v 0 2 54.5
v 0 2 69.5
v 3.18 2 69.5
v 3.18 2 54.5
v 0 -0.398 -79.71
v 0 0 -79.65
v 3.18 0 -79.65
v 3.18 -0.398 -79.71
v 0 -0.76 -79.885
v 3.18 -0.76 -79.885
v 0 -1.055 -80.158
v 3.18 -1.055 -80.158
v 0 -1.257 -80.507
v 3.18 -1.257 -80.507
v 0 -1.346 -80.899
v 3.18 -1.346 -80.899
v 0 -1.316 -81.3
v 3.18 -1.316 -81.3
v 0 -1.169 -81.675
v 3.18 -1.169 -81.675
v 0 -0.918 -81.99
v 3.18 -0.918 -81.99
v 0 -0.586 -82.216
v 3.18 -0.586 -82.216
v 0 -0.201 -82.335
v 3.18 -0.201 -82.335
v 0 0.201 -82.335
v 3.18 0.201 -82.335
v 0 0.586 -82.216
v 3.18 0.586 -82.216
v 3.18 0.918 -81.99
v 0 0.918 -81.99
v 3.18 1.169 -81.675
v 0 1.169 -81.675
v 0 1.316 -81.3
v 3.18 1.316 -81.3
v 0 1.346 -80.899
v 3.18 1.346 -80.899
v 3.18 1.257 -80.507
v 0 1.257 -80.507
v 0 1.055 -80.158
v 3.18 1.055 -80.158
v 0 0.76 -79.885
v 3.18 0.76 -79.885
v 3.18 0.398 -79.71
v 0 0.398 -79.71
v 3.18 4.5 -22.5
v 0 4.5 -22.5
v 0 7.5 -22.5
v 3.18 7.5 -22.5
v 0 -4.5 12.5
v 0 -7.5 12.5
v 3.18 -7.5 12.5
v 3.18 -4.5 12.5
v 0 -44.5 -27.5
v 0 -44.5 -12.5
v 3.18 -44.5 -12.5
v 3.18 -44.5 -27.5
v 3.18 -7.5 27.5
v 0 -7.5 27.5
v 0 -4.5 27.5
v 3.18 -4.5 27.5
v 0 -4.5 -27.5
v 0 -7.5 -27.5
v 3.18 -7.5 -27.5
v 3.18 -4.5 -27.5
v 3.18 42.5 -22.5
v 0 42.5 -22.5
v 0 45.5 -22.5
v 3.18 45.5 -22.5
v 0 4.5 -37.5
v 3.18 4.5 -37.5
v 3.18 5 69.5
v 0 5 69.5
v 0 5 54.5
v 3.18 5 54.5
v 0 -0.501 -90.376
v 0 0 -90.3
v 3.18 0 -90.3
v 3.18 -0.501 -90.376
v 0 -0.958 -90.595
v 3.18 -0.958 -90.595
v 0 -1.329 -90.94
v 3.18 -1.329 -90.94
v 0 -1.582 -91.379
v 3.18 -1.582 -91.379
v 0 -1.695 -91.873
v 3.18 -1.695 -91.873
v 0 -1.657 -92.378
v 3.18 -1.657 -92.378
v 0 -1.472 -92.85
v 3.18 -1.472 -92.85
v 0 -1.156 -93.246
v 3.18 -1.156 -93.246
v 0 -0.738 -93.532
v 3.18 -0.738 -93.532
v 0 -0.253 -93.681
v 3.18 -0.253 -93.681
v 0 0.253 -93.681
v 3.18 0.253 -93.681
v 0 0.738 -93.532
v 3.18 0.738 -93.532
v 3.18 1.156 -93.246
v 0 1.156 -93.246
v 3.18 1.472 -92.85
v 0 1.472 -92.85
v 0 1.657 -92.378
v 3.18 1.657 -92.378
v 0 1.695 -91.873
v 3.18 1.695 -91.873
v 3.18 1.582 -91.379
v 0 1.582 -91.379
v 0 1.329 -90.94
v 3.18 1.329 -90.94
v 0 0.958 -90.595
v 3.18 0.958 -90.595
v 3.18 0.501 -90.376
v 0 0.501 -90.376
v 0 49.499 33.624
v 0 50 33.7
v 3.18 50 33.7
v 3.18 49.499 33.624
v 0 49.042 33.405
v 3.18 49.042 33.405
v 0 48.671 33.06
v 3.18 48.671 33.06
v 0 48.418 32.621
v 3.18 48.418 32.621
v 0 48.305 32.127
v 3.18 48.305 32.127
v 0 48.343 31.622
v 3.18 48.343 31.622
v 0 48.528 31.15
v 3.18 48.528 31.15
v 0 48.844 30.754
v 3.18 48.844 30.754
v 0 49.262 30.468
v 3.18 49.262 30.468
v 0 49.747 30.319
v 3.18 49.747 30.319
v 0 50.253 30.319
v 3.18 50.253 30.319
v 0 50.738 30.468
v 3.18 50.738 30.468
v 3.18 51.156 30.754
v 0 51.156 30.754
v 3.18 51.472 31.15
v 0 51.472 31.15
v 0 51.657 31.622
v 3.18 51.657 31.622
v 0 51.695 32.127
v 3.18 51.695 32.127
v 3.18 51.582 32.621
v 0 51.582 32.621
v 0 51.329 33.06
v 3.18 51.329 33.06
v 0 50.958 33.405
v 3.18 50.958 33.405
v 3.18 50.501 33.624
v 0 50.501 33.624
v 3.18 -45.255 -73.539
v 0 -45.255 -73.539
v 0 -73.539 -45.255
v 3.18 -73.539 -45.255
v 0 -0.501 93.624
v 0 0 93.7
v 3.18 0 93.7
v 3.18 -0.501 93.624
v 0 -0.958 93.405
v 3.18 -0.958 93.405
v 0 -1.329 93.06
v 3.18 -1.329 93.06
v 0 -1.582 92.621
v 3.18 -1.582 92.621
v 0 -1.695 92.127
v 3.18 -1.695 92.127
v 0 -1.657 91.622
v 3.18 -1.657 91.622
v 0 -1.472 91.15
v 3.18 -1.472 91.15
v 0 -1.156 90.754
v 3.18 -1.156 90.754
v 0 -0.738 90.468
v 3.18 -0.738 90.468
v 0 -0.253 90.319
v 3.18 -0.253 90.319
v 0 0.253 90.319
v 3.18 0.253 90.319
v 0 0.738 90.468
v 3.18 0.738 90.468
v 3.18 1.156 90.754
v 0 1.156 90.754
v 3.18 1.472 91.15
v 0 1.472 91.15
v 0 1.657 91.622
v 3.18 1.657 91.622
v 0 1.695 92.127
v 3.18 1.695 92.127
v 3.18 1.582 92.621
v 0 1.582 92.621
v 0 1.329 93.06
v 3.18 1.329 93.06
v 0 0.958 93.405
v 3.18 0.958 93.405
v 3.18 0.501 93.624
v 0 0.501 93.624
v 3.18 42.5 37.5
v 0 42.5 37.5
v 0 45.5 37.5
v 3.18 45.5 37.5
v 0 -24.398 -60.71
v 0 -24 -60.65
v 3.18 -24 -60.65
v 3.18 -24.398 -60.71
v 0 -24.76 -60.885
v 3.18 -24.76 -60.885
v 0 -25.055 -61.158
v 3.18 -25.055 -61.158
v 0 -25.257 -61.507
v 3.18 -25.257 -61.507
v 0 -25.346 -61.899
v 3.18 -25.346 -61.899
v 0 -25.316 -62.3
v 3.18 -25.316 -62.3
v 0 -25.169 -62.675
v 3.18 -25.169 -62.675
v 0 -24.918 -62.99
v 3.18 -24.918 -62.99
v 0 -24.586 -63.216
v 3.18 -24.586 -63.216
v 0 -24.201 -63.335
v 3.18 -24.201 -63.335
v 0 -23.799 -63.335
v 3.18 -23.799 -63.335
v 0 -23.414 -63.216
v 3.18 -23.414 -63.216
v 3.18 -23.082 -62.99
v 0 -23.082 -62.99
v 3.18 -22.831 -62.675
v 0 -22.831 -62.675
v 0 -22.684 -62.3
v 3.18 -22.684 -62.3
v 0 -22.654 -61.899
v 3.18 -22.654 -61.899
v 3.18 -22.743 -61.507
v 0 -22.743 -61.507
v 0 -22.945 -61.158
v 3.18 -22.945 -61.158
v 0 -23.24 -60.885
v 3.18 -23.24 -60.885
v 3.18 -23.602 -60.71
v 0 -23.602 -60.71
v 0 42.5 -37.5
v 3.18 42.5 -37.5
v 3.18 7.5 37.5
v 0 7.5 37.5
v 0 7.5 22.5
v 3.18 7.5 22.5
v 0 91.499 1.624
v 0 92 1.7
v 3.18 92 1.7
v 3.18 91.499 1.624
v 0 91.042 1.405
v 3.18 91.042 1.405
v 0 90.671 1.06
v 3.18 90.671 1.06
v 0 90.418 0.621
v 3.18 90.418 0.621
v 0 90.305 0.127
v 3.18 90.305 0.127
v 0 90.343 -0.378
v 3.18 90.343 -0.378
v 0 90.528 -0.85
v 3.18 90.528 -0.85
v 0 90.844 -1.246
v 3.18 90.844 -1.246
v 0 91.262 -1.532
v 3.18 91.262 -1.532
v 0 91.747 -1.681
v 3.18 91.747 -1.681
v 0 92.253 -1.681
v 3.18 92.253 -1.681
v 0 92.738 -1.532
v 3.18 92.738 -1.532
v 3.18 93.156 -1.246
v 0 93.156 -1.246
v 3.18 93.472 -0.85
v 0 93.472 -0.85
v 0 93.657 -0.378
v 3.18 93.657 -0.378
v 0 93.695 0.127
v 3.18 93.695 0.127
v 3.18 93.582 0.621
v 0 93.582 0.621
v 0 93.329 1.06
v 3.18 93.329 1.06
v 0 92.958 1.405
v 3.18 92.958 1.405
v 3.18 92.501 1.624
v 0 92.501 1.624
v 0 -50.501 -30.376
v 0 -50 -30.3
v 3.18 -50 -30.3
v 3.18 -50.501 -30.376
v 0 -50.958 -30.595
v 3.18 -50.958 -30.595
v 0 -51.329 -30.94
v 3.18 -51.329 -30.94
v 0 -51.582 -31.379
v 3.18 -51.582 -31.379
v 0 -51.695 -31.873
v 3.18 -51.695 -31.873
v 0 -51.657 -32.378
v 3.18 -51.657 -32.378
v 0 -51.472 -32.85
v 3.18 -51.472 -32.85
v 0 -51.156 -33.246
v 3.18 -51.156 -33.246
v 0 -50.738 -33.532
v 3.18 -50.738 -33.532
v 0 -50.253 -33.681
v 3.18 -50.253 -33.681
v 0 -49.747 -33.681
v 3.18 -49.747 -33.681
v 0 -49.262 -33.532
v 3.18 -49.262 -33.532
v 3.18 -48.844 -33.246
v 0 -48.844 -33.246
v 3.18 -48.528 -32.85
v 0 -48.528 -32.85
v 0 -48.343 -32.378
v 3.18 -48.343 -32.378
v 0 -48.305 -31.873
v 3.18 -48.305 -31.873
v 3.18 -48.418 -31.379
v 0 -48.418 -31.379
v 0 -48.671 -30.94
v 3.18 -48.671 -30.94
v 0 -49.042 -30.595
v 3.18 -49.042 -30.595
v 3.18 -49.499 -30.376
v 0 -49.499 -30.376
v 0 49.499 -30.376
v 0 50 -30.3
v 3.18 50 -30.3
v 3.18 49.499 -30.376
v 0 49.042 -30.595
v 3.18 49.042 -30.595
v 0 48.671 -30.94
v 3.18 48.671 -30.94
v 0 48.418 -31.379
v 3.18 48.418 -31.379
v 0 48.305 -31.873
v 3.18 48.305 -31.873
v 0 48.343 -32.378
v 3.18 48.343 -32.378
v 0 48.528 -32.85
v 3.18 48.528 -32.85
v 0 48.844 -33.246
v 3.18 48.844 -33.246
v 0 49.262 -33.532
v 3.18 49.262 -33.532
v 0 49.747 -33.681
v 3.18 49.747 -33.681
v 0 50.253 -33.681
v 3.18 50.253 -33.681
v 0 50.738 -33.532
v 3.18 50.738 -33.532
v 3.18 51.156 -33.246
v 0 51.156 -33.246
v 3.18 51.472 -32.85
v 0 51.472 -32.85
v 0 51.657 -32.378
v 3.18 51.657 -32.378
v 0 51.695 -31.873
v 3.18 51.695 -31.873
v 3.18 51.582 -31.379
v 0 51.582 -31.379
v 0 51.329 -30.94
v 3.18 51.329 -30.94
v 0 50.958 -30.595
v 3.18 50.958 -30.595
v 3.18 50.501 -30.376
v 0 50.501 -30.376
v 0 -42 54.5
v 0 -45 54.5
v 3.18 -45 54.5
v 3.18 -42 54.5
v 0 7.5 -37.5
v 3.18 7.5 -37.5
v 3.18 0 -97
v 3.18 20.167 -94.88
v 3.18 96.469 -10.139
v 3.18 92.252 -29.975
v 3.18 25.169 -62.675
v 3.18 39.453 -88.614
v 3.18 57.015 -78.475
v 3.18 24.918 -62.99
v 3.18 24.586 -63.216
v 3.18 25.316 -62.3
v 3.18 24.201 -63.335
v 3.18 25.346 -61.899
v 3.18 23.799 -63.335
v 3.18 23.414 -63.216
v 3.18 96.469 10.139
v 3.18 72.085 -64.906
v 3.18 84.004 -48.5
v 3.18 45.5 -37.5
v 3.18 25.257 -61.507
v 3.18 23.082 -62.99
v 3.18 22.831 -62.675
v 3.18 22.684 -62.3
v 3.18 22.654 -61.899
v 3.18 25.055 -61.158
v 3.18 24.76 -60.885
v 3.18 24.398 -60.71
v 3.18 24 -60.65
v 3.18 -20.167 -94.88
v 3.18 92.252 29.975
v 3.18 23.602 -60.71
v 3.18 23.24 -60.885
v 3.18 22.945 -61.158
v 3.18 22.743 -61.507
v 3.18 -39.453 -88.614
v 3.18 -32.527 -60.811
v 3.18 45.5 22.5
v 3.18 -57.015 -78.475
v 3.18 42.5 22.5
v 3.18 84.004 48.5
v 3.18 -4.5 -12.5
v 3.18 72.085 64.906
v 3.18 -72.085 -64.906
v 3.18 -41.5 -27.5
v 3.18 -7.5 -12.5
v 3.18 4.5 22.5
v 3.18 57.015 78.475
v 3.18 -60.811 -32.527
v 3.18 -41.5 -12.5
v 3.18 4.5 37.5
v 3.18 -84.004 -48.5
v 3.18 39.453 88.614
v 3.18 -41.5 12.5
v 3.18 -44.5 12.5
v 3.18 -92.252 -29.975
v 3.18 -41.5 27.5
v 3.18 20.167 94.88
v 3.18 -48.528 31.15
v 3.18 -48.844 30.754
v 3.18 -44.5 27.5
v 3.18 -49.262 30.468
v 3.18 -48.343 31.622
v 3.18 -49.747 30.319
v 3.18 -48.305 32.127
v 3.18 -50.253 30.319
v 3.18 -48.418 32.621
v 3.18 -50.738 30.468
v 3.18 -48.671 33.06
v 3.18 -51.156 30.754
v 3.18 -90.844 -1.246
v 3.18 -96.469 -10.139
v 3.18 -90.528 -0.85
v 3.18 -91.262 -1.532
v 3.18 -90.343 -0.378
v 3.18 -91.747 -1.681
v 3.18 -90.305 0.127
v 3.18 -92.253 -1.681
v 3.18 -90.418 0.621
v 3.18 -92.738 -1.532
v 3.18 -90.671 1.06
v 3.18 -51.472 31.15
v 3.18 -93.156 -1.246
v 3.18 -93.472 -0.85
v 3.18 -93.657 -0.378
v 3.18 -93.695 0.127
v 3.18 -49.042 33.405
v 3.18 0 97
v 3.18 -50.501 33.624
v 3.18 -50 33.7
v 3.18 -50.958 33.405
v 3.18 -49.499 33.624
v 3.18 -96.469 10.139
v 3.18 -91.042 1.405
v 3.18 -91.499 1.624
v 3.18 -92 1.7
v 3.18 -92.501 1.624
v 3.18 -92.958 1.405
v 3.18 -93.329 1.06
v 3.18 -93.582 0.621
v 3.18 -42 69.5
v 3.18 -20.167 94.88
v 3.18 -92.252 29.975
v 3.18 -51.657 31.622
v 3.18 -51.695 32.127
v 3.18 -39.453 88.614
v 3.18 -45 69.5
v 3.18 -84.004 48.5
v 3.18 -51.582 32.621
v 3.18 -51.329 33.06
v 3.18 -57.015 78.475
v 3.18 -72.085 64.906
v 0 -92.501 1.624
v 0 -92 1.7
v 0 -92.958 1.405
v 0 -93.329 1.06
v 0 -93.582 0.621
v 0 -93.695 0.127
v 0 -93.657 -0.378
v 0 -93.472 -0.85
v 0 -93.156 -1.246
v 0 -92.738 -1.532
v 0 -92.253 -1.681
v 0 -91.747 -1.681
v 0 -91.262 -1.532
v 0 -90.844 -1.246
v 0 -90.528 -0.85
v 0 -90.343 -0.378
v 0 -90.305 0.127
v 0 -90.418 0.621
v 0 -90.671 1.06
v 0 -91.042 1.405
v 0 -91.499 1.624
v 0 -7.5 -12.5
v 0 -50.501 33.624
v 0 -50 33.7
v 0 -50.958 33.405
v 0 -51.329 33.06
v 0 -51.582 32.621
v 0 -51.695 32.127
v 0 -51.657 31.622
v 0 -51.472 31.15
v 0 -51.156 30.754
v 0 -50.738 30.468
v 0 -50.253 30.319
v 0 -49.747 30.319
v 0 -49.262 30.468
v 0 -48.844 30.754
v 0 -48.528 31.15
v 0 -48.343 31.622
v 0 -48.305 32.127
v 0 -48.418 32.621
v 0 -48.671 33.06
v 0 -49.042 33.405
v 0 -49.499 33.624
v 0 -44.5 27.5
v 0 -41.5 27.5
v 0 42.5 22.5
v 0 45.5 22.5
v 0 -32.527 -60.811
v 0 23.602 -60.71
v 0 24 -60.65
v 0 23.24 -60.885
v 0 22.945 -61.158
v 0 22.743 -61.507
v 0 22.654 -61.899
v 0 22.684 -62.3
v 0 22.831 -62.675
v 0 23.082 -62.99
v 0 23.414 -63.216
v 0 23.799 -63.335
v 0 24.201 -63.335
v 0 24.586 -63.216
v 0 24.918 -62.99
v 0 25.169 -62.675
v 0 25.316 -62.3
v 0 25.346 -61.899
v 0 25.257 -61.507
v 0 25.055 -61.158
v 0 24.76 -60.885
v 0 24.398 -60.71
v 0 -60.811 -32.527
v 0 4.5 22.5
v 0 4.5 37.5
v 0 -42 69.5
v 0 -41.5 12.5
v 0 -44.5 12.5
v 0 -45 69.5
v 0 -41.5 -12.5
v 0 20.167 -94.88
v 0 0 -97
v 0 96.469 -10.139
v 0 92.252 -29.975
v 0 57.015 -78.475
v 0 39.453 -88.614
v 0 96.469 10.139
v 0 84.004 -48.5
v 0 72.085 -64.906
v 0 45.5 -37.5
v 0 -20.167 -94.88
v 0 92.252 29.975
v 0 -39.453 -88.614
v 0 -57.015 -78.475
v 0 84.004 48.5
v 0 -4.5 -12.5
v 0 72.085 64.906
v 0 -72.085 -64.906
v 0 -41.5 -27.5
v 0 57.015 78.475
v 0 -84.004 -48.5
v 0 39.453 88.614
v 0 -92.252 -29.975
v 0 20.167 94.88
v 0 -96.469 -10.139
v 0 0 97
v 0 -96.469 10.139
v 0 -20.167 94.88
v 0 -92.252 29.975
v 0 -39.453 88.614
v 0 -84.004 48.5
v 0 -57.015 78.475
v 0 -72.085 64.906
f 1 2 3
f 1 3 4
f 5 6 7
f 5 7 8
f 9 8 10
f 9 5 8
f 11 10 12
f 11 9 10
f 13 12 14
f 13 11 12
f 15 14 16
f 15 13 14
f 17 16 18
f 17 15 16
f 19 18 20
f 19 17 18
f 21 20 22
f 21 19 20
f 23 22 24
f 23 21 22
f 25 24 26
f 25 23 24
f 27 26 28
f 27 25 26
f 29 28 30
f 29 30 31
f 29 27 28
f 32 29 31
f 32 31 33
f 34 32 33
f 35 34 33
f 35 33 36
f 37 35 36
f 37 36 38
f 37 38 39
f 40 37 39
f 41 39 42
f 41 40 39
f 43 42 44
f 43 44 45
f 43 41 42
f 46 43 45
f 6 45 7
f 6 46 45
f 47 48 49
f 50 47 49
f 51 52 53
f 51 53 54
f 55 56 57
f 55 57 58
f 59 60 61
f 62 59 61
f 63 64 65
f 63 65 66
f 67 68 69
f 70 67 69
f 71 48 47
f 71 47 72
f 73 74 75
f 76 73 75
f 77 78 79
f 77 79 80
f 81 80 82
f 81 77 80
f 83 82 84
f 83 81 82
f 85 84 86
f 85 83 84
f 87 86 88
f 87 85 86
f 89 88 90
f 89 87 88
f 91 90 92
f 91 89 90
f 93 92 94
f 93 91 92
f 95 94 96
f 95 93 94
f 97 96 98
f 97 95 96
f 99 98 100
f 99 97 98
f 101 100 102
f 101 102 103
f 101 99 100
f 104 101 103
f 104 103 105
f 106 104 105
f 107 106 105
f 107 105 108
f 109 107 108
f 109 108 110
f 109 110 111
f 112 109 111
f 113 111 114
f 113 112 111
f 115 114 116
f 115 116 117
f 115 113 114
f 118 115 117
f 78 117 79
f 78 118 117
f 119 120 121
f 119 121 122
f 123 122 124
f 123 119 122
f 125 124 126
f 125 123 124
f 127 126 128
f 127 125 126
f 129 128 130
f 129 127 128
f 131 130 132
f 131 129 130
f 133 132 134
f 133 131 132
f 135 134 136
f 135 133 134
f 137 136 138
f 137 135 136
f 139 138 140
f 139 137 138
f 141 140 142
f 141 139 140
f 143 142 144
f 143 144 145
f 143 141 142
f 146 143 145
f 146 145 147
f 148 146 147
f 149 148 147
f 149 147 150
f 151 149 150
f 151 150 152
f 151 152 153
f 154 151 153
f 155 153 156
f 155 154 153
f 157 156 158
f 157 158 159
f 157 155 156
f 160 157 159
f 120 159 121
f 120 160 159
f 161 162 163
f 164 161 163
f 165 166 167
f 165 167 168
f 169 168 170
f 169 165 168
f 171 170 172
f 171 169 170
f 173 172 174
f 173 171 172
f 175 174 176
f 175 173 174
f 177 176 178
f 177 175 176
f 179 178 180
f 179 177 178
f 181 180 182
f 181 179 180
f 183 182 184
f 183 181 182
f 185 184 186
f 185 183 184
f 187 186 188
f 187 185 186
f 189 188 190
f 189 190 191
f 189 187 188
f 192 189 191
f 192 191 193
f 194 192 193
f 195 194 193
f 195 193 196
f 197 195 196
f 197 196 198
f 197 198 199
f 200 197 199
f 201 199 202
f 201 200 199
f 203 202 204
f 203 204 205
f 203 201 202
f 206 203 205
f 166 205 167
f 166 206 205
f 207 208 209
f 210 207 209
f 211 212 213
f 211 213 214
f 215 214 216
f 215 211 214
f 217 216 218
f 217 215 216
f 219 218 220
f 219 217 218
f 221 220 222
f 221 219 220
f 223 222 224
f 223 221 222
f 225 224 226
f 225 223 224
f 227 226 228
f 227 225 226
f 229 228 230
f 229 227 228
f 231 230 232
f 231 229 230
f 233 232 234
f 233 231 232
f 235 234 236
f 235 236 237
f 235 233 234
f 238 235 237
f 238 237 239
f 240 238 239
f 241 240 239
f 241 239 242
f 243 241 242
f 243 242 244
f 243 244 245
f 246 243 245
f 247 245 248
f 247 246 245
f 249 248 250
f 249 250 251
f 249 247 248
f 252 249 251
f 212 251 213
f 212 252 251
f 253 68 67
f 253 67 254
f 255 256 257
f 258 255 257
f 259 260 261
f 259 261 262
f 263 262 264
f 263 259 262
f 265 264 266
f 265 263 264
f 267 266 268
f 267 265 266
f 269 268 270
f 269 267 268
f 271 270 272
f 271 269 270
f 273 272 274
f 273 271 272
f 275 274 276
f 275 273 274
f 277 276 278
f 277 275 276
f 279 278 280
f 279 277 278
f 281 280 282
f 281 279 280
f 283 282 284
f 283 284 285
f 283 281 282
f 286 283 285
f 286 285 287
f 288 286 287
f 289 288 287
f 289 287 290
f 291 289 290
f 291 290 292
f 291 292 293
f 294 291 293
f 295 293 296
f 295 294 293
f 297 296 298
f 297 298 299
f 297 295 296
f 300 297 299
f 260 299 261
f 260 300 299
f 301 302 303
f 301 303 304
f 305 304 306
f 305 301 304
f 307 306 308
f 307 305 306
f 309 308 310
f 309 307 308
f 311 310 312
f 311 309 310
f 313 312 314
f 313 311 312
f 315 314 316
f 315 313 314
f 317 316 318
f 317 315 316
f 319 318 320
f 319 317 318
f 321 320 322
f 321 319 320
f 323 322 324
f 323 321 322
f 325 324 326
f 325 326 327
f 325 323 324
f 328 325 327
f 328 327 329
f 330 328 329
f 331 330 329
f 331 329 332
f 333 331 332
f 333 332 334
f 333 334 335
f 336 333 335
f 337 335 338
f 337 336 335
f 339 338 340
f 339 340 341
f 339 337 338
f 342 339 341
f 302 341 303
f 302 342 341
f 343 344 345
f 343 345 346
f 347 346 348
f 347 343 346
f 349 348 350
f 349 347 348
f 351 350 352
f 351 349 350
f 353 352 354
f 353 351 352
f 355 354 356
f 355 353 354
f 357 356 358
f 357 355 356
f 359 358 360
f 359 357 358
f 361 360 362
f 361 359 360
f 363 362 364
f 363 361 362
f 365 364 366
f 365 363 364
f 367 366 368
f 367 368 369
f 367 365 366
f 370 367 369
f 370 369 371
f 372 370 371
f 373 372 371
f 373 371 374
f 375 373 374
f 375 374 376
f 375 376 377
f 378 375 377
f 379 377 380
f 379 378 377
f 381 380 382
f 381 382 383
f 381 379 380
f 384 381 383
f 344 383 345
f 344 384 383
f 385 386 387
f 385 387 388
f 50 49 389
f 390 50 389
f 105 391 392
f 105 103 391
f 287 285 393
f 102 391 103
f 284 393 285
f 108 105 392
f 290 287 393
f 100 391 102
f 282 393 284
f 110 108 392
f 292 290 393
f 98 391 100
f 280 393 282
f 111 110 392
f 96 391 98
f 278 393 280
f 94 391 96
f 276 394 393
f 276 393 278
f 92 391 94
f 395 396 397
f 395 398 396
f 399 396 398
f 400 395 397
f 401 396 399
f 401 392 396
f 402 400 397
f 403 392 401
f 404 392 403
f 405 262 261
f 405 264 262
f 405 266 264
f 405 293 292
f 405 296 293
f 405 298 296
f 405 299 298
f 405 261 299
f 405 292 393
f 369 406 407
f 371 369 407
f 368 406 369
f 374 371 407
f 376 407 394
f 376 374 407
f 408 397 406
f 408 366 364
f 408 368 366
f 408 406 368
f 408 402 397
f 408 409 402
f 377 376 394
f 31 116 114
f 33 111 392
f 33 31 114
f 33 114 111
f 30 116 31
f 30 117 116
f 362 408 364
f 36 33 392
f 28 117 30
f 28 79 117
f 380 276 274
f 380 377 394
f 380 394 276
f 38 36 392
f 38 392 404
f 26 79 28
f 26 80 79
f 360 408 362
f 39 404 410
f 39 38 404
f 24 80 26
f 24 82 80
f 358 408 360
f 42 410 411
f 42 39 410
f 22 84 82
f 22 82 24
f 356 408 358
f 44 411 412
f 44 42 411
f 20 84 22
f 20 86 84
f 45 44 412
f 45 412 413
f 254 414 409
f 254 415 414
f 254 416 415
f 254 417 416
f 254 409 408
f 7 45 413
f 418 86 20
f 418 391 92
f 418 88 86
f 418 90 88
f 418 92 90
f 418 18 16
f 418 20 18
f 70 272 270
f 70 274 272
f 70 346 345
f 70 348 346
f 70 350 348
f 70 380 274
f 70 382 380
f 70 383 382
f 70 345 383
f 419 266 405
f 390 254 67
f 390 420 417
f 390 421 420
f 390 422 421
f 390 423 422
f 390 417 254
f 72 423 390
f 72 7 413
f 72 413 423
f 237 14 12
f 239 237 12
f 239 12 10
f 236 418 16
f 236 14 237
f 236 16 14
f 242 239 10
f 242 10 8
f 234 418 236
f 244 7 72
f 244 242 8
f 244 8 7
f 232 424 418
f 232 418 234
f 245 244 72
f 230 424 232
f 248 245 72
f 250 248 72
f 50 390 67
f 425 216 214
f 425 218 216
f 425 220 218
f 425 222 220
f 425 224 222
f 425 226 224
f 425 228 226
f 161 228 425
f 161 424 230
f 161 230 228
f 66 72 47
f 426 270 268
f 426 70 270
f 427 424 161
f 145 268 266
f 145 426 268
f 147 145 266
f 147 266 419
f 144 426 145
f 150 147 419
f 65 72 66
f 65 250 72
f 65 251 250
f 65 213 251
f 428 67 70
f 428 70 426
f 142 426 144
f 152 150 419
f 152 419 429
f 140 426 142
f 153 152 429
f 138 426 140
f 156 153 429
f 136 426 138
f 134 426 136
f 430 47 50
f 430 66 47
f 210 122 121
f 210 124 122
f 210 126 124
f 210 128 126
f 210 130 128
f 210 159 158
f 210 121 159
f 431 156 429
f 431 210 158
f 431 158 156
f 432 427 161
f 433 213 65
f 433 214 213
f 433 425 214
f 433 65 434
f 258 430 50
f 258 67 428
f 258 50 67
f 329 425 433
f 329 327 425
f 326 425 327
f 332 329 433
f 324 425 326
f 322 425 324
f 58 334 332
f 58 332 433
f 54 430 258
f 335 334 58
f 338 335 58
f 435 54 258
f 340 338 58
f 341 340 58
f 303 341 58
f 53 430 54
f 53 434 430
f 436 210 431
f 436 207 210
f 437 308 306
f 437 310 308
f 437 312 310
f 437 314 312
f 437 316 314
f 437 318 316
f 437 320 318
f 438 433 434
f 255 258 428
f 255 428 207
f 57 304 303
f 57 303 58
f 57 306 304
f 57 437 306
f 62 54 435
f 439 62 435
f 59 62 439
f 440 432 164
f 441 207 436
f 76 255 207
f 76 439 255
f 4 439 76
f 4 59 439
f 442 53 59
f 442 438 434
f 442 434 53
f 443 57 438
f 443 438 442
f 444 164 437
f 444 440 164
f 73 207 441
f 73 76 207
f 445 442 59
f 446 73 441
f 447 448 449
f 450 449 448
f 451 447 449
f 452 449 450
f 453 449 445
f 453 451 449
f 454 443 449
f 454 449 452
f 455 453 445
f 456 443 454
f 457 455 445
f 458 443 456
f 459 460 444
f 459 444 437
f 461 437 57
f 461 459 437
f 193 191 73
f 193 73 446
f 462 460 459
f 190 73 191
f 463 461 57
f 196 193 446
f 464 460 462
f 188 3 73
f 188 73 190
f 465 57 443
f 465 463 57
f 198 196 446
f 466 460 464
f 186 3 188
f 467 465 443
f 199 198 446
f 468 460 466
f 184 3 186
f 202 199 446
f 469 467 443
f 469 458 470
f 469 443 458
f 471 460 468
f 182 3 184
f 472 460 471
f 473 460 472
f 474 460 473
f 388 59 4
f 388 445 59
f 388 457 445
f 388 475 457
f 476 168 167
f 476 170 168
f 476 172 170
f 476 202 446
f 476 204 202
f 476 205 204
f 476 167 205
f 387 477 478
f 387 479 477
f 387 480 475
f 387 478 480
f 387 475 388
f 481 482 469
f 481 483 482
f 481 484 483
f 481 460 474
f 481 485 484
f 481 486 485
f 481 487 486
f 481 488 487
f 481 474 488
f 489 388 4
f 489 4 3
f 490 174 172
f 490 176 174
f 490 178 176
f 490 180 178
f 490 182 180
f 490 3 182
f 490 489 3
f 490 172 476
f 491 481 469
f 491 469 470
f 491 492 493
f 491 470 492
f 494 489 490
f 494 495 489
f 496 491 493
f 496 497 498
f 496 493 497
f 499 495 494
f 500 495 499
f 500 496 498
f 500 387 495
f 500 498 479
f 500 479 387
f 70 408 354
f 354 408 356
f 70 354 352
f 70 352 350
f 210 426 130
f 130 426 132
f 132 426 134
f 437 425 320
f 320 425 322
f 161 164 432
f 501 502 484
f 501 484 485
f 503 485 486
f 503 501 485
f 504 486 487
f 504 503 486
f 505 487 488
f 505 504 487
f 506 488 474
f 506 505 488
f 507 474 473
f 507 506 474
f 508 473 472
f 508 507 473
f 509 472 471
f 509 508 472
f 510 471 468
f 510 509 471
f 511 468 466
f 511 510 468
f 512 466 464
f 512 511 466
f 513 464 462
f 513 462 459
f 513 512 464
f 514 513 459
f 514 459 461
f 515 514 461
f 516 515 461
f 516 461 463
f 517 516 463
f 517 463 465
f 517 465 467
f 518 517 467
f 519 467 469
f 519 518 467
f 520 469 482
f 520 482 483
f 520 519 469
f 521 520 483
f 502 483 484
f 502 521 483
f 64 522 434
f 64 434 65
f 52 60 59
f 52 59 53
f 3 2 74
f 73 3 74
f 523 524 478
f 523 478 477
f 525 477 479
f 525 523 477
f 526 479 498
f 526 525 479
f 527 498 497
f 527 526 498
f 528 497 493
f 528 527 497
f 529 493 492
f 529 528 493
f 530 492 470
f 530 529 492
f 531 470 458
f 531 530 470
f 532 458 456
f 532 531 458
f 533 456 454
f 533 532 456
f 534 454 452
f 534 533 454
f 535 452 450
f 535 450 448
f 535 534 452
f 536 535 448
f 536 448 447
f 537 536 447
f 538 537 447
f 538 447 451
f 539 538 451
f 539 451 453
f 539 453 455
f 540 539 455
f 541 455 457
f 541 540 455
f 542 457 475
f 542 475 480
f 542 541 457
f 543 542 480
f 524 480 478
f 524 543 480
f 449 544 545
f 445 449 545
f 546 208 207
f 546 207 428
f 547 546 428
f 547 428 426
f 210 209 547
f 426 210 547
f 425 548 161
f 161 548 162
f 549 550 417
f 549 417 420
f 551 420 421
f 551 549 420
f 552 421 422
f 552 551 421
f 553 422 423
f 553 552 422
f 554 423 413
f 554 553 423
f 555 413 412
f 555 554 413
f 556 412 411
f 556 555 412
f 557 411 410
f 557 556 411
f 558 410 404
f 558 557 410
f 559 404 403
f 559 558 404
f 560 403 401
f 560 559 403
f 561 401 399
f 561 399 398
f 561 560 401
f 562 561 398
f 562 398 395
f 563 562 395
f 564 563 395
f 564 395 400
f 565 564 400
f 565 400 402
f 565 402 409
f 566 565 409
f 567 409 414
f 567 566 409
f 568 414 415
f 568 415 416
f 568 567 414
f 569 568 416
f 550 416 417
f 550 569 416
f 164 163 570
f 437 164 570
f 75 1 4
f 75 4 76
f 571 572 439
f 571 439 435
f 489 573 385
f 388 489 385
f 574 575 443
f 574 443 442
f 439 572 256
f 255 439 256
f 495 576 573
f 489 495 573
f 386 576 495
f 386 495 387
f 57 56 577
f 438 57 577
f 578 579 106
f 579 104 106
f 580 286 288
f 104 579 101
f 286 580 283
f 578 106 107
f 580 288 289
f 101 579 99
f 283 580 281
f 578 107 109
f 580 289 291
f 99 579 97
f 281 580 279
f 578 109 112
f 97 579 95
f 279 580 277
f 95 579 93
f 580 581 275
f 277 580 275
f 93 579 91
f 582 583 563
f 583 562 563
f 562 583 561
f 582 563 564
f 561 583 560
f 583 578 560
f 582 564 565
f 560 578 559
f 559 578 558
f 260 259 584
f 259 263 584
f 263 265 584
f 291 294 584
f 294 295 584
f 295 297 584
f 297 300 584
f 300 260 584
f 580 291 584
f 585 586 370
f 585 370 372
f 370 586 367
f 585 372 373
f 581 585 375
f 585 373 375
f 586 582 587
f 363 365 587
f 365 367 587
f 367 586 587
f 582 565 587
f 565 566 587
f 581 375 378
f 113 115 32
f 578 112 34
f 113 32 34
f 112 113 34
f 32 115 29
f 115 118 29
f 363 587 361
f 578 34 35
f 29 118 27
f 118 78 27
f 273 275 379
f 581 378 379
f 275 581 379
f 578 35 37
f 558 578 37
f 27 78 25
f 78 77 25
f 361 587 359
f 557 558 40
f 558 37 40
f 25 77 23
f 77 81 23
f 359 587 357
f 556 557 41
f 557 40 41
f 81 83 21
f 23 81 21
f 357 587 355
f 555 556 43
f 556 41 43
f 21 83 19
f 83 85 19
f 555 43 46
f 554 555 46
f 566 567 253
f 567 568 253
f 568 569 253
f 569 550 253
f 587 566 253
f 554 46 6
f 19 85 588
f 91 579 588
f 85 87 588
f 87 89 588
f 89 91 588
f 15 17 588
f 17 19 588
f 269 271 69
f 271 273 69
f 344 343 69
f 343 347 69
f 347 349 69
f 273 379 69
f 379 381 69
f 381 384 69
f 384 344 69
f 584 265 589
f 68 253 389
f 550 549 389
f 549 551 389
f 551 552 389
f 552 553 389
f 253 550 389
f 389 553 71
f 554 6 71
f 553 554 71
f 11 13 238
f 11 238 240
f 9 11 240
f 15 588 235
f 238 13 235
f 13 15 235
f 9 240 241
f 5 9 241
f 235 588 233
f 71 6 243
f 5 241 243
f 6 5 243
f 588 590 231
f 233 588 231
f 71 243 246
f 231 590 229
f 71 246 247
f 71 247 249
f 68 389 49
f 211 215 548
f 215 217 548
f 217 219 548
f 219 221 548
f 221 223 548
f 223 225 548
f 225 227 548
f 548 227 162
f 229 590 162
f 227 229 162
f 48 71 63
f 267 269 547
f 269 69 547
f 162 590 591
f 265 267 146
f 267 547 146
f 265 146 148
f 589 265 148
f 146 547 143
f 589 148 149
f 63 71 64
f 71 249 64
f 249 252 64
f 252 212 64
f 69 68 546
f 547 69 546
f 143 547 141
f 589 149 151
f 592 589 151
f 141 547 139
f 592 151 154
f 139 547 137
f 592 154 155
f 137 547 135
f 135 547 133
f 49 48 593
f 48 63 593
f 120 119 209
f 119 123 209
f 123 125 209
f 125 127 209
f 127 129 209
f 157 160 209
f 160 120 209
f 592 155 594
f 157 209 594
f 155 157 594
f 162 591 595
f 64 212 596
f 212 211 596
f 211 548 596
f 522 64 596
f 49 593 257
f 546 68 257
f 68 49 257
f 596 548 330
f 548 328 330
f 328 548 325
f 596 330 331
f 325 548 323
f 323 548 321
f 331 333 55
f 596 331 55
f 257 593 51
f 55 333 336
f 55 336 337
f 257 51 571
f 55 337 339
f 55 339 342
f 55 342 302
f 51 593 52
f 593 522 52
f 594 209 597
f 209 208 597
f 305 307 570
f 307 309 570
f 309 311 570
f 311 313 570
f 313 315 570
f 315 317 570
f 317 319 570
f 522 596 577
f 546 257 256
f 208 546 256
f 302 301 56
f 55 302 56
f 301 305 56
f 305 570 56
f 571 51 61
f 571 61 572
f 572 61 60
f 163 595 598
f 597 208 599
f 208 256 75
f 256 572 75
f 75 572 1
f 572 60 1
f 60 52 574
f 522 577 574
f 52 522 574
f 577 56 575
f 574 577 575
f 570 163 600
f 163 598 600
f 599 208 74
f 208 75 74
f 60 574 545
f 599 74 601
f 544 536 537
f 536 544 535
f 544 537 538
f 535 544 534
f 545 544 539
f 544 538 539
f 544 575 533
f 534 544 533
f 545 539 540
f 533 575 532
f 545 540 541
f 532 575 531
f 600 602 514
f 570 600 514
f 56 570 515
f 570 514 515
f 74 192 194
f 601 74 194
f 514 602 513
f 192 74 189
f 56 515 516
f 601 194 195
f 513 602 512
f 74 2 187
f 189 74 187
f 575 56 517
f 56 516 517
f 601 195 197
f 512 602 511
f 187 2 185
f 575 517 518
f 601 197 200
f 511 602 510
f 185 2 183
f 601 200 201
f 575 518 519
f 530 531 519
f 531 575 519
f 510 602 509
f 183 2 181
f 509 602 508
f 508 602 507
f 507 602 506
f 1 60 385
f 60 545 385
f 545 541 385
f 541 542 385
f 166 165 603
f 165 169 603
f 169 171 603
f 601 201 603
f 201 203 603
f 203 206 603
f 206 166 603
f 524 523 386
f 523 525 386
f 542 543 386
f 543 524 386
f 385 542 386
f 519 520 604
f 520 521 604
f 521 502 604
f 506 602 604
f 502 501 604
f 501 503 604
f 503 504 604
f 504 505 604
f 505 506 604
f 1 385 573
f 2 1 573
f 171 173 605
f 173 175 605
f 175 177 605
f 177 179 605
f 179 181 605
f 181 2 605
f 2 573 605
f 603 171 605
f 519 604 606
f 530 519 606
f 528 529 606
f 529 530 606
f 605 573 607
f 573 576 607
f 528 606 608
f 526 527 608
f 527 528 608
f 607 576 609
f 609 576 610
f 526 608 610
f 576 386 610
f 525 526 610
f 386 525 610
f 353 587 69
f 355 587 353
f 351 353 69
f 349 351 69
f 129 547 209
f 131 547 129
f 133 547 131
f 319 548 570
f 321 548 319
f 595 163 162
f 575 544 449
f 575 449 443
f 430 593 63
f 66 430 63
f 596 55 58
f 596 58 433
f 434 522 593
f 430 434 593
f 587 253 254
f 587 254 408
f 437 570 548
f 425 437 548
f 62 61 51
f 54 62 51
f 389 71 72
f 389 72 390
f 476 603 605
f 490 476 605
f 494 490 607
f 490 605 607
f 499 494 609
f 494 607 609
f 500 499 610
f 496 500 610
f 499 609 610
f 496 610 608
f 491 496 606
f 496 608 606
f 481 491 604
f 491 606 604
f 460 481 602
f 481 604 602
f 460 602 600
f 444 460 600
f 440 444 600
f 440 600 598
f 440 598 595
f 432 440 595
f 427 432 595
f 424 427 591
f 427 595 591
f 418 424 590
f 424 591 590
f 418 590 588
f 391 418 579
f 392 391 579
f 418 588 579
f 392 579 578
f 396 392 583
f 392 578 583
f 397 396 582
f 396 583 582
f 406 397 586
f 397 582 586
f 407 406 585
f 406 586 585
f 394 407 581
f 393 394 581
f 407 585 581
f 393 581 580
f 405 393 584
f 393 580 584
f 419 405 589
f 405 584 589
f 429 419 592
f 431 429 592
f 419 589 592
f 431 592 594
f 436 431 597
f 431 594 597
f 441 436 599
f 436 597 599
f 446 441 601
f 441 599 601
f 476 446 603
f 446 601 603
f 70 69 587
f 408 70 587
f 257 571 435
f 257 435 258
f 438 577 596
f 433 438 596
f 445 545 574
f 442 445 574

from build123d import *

# Parameters (mm, degrees)
TRAY_SKETCH_R   = 97
TRAY_SKETCH_R_2 = 1.7
TRAY_SKETCH_R_3 = 1.35
TRAY_SKETCH_W   = 15
TRAY_SKETCH_H   = 3
TRAY_DEPTH      = 3.18


with BuildPart() as part:
    # Tray Sketch → Tray (new body)
    with BuildSketch(Plane(origin=(0, 0, 0), x_dir=(0, 0, -1), z_dir=(1, 0, 0))):
        Circle(TRAY_SKETCH_R)
        with Locations((0, 92)):
            Circle(TRAY_SKETCH_R_2, mode=Mode.SUBTRACT)
        with Locations((-92, 0)):
            Circle(TRAY_SKETCH_R_2, mode=Mode.SUBTRACT)
        with Locations((0, -92)):
            Circle(TRAY_SKETCH_R_2, mode=Mode.SUBTRACT)
        with Locations((92, 0)):
            Circle(TRAY_SKETCH_R_2, mode=Mode.SUBTRACT)
        with Locations((32, -50)):
            Circle(TRAY_SKETCH_R_2, mode=Mode.SUBTRACT)
        with Locations((-32, -50)):
            Circle(TRAY_SKETCH_R_2, mode=Mode.SUBTRACT)
        with Locations((32, 50)):
            Circle(TRAY_SKETCH_R_2, mode=Mode.SUBTRACT)
        with Locations((-32, 50)):
            Circle(TRAY_SKETCH_R_2, mode=Mode.SUBTRACT)
        with Locations((62, -24)):
            Circle(TRAY_SKETCH_R_3, mode=Mode.SUBTRACT)
        with Locations((62, 24)):
            Circle(TRAY_SKETCH_R_3, mode=Mode.SUBTRACT)
        with Locations((81, 0)):
            Circle(TRAY_SKETCH_R_3, mode=Mode.SUBTRACT)
        Polygon((32.526911935, -60.811183182), (60.811183182, -32.526911935), (73.539105243, -45.254833996), (45.254833996, -73.539105243), align=None, mode=Mode.SUBTRACT)
        with Locations((-30, 6)):
            Rectangle(TRAY_SKETCH_W, TRAY_SKETCH_H, mode=Mode.SUBTRACT)
        with Locations((-30, 44)):
            Rectangle(TRAY_SKETCH_W, TRAY_SKETCH_H, mode=Mode.SUBTRACT)
        with Locations((30, 6)):
            Rectangle(TRAY_SKETCH_W, TRAY_SKETCH_H, mode=Mode.SUBTRACT)
        with Locations((30, 44)):
            Rectangle(TRAY_SKETCH_W, TRAY_SKETCH_H, mode=Mode.SUBTRACT)
        with Locations((-20, -43)):
            Rectangle(TRAY_SKETCH_W, TRAY_SKETCH_H, mode=Mode.SUBTRACT)
        with Locations((-20, -6)):
            Rectangle(TRAY_SKETCH_W, TRAY_SKETCH_H, mode=Mode.SUBTRACT)
        with Locations((20, -43)):
            Rectangle(TRAY_SKETCH_W, TRAY_SKETCH_H, mode=Mode.SUBTRACT)
        with Locations((20, -6)):
            Rectangle(TRAY_SKETCH_W, TRAY_SKETCH_H, mode=Mode.SUBTRACT)
        with Locations((-62, -43.5)):
            Rectangle(TRAY_SKETCH_W, TRAY_SKETCH_H, mode=Mode.SUBTRACT)
        with Locations((-62, 3.5)):
            Rectangle(TRAY_SKETCH_W, TRAY_SKETCH_H, mode=Mode.SUBTRACT)
    extrude(amount=TRAY_DEPTH)


solid = part.part
